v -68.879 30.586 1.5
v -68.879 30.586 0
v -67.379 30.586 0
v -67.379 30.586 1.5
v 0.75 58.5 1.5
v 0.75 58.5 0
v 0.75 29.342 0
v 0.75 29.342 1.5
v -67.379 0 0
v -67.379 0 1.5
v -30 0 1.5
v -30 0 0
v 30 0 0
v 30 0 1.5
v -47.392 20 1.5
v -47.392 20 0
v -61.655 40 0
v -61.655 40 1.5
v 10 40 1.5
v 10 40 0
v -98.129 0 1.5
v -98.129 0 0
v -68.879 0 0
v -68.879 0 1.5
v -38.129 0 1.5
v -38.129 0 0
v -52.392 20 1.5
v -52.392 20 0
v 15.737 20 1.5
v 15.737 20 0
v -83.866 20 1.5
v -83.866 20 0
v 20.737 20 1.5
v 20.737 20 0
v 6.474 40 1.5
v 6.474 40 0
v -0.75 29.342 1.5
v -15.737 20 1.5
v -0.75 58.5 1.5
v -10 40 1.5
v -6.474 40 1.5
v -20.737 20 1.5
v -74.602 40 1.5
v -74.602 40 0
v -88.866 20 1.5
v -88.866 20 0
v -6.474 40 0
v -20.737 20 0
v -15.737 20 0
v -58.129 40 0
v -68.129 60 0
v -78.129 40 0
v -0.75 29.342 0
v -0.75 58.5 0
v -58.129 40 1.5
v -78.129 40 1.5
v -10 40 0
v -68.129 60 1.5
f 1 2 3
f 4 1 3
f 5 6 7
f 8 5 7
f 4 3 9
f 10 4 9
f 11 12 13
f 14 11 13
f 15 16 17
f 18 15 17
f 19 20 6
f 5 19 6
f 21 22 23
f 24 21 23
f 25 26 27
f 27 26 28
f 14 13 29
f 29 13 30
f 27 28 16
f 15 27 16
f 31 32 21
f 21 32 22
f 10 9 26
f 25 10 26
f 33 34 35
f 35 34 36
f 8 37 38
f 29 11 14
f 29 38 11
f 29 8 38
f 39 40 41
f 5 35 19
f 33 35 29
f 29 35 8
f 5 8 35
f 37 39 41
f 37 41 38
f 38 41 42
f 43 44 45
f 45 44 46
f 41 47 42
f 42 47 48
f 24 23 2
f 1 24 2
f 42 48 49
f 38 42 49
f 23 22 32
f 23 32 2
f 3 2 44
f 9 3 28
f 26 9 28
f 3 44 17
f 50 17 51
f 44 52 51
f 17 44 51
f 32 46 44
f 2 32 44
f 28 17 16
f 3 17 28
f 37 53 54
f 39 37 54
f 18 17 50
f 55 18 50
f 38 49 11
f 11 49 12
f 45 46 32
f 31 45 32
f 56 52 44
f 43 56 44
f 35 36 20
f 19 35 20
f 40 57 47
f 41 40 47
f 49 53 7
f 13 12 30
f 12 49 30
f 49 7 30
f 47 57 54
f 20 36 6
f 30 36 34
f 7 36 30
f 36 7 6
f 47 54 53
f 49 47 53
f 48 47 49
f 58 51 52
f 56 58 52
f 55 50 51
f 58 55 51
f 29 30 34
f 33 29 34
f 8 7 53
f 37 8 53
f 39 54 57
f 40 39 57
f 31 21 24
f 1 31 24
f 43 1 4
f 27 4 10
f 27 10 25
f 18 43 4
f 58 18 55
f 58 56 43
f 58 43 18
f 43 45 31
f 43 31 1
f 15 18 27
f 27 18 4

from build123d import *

# Parameters (mm, degrees)
F1_DEPTH = 1.5


with BuildPart() as f1:
    # F0 (on Top) → F1 (new body)
    with BuildSketch(Plane.XY):
        Polygon((-30, 0), (30, 0), (15.736768, 20), (20.736768, 20), (6.473536, 40), (10, 40), (0.75, 58.5), (0.75, 29.341811), (-0.75, 29.341811), (-0.75, 58.5), (-10, 40), (-6.473536, 40), (-20.736768, 20), (-15.736768, 20), align=None)
        Polygon((-61.655392, 40), (-58.128929, 40), (-68.128929, 60), (-78.128929, 40), (-74.602465, 40), (-88.865697, 20), (-83.865697, 20), (-98.128929, 0), (-68.878929, 0), (-68.878929, 30.585837), (-67.378929, 30.585837), (-67.378929, 0), (-38.128929, 0), (-52.392161, 20), (-47.392161, 20), align=None)
    extrude(amount=F1_DEPTH)


solid = f1.part
